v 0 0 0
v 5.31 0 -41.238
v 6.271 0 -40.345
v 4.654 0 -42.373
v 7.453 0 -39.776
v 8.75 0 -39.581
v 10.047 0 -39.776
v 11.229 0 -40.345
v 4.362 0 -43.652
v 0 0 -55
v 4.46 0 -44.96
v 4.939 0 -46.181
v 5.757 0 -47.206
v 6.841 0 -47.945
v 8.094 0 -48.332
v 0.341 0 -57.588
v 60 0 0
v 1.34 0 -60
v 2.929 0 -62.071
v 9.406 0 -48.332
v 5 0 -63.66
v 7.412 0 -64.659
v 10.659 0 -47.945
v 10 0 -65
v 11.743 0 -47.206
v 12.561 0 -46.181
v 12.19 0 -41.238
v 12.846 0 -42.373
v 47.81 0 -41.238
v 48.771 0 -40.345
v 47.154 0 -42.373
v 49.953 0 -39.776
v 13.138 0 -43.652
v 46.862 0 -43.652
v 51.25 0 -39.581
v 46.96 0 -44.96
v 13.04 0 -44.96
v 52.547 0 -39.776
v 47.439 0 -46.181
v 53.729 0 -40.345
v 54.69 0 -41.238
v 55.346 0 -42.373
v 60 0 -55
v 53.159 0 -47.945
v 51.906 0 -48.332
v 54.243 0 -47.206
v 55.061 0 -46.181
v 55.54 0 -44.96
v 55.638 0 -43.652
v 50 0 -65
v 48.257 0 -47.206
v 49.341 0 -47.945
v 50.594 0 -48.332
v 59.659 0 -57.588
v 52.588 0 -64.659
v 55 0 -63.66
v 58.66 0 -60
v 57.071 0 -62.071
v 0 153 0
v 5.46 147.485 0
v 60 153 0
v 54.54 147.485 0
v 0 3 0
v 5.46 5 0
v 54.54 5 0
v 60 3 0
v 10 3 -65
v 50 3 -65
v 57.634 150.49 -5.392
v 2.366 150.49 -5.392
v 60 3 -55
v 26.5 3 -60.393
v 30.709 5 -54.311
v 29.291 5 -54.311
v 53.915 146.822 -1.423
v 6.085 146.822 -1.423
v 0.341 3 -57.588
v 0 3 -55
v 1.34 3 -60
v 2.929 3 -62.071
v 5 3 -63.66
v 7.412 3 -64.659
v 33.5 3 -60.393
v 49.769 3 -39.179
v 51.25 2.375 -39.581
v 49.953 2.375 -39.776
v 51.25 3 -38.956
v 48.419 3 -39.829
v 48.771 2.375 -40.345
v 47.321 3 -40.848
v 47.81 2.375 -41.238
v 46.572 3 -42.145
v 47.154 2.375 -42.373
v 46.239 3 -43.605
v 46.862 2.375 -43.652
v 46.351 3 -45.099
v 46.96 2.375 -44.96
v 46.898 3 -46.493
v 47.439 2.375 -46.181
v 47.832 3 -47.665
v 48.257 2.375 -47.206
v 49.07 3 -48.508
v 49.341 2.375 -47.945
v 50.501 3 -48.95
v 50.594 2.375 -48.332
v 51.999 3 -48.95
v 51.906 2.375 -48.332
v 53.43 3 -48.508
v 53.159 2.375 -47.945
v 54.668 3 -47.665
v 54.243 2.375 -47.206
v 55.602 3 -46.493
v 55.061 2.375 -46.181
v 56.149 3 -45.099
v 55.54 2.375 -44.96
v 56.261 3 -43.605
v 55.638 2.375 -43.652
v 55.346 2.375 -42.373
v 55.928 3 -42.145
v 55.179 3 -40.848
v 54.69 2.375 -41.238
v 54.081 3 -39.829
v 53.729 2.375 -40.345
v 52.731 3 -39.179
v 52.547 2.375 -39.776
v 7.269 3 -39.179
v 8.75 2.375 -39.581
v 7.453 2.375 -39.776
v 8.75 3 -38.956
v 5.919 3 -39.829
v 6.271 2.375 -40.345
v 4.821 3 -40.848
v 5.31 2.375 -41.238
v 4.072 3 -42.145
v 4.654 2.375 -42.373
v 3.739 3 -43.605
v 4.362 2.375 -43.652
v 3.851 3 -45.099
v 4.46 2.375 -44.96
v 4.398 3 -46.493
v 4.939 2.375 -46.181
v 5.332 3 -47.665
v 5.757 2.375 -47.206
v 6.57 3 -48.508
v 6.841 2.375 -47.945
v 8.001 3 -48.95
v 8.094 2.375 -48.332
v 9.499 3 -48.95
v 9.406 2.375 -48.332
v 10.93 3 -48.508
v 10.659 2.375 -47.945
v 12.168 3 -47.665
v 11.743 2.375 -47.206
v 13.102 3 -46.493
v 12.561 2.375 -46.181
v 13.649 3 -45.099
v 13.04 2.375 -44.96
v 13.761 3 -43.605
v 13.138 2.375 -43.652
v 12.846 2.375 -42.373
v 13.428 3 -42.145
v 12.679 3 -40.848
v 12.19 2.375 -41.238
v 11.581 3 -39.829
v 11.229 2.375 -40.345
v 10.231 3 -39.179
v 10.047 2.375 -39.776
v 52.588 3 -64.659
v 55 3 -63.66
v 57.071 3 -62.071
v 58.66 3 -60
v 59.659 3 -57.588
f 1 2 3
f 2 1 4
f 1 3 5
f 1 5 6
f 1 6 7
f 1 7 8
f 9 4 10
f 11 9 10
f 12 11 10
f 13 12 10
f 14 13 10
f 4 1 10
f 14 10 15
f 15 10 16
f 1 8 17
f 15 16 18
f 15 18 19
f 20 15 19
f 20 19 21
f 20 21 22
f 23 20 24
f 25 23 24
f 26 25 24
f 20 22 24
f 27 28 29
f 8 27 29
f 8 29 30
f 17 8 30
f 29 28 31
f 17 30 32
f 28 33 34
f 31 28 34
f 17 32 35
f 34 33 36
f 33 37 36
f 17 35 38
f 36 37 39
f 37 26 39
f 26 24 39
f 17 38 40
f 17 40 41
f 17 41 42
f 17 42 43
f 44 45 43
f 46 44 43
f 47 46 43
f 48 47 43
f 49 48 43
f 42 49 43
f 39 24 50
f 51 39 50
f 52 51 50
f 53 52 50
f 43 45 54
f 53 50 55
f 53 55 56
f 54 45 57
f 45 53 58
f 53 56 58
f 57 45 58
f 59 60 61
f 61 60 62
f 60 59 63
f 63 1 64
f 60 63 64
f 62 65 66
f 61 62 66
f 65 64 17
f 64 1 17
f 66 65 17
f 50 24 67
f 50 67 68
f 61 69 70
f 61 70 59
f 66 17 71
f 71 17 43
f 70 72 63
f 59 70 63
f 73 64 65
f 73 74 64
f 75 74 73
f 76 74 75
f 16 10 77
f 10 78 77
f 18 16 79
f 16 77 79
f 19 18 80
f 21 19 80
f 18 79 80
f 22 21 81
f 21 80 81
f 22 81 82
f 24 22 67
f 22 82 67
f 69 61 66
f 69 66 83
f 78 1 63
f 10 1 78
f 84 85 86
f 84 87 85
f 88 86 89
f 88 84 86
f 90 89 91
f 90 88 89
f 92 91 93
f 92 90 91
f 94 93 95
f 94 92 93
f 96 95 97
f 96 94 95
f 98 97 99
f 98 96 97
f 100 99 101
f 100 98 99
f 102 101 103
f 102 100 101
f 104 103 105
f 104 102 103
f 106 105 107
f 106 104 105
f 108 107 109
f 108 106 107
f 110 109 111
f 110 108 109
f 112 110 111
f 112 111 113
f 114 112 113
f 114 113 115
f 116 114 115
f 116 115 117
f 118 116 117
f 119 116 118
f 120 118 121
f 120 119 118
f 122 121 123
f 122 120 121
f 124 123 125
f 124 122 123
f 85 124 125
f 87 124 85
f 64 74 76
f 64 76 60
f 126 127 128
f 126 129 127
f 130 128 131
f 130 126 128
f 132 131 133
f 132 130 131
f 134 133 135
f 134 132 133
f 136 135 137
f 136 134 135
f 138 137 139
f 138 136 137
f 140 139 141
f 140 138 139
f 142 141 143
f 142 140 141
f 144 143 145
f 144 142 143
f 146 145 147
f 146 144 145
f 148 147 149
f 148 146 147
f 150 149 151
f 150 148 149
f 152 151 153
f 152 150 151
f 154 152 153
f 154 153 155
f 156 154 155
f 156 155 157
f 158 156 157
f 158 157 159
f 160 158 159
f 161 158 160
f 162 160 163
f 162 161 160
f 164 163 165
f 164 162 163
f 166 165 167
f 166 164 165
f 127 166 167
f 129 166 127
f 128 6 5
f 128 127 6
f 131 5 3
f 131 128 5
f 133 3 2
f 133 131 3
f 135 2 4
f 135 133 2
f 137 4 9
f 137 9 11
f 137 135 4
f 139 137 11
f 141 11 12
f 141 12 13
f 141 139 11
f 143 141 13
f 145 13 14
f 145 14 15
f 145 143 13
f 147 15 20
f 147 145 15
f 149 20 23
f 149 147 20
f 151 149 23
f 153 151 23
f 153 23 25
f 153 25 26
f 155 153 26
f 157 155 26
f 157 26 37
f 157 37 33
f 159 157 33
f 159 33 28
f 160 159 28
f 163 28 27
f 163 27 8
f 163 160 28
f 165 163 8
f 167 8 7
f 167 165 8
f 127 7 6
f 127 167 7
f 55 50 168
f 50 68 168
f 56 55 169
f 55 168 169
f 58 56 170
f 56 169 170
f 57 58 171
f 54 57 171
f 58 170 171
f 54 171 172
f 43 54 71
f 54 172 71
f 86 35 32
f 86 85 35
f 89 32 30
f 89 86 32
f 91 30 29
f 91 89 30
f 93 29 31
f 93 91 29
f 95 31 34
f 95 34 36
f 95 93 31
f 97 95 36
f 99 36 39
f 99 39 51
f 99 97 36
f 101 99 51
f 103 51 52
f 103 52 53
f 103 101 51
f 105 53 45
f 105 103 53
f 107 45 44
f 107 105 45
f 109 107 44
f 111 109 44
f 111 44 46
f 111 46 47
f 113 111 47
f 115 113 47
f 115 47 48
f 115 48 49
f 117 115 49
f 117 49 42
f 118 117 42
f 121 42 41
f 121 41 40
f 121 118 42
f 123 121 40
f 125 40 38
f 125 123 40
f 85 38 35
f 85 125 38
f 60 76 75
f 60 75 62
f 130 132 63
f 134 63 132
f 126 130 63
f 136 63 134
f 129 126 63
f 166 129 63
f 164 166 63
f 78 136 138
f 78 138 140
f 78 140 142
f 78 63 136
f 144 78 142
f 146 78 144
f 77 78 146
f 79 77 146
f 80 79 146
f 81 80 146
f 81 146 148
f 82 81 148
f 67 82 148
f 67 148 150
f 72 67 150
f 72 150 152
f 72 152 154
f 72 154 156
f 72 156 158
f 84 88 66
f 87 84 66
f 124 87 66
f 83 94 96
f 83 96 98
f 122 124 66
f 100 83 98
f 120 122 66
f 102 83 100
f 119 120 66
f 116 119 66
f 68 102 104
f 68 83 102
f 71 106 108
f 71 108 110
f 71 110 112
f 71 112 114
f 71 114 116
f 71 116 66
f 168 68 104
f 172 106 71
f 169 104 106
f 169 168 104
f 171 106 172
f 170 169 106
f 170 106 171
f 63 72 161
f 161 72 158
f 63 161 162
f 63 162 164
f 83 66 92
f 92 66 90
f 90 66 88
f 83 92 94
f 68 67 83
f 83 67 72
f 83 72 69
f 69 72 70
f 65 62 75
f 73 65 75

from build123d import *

# Parameters (mm, degrees)
SKETCH1_W                        = 60
SKETCH1_H                        = 65
BOSS_EXTRUDE2_DEPTH              = 3
BOSS_EXTRUDE4_DEPTH              = 150
CUT_EXTRUDE2_DEPTH               = 150
FILLET1_R                        = 10
SHELL1_T                         = -5
M10X1_25_TAPPED_HOLE1_AT_2_COUNT = 2
M10X1_25_TAPPED_HOLE1_AT_2_PITCH = 42.5


with BuildPart() as part:
    # Sketch1 → Boss-Extrude2 (new body)
    with BuildSketch(Plane(origin=(0, 0, 0), x_dir=(1, 0, 0), z_dir=(0, 1, 0))):
        with Locations((30, 32.5)):
            Rectangle(SKETCH1_W, SKETCH1_H)
    extrude(amount=BOSS_EXTRUDE2_DEPTH)

    # Sketch3 → Boss-Extrude4 (add)
    with BuildSketch(Plane(origin=(0, 3, 0), x_dir=(1, 0, 0), z_dir=(0, 1, 0))):
        Polygon((0, 0), (60, 0), (33.5, 60.392887062), (26.5, 60.392887062), align=None)
    extrude(amount=BOSS_EXTRUDE4_DEPTH)

    # Sketch5 → Cut-Extrude2 (cut)
    with BuildSketch(Plane.ZY):
        Polygon((-60.392887062, 3), (-5.391813619, 150.489864796), (0, 153), (0, 157.732510012), (-60.392887062, 157.732510012), align=None)
    extrude(amount=-CUT_EXTRUDE2_DEPTH, mode=Mode.SUBTRACT)

    # Fillet1
    fillet1_edges = [part.edges().sort_by_distance(p)[0] for p in [
        (0, 1.5, -65),
        (60, 1.5, -65),
    ]]
    fillet(fillet1_edges, radius=FILLET1_R)

    # Shell1
    shell1_openings = [part.faces().sort_by_distance(p)[0] for p in [
        (30, 52, 0),
    ]]
    offset(amount=SHELL1_T, openings=shell1_openings)

    # Sketch7 → M10x1.25 Tapped Hole1 (revolve, cut)
    with BuildSketch(Plane(origin=(51.25, 3, -43.980915379), x_dir=(0, 0, 1), z_dir=(1, 0, 0))):
        Polygon((0, 0), (0, 3), (4.4, 3), (4.4, 0.625), (5.025, 0), align=None)
    m10x1_25_tapped_hole1 = revolve(axis=Axis((51.25, 9.35, -43.980915379), (0, -1, 0)), mode=Mode.SUBTRACT)

    # M10x1.25 Tapped Hole1 at 2: M10x1.25 Tapped Hole1 ×2
    with Locations(*[(-i * M10X1_25_TAPPED_HOLE1_AT_2_PITCH, 0, 0) for i in range(1, M10X1_25_TAPPED_HOLE1_AT_2_COUNT)]):
        add(m10x1_25_tapped_hole1, mode=Mode.SUBTRACT)


solid = part.part
